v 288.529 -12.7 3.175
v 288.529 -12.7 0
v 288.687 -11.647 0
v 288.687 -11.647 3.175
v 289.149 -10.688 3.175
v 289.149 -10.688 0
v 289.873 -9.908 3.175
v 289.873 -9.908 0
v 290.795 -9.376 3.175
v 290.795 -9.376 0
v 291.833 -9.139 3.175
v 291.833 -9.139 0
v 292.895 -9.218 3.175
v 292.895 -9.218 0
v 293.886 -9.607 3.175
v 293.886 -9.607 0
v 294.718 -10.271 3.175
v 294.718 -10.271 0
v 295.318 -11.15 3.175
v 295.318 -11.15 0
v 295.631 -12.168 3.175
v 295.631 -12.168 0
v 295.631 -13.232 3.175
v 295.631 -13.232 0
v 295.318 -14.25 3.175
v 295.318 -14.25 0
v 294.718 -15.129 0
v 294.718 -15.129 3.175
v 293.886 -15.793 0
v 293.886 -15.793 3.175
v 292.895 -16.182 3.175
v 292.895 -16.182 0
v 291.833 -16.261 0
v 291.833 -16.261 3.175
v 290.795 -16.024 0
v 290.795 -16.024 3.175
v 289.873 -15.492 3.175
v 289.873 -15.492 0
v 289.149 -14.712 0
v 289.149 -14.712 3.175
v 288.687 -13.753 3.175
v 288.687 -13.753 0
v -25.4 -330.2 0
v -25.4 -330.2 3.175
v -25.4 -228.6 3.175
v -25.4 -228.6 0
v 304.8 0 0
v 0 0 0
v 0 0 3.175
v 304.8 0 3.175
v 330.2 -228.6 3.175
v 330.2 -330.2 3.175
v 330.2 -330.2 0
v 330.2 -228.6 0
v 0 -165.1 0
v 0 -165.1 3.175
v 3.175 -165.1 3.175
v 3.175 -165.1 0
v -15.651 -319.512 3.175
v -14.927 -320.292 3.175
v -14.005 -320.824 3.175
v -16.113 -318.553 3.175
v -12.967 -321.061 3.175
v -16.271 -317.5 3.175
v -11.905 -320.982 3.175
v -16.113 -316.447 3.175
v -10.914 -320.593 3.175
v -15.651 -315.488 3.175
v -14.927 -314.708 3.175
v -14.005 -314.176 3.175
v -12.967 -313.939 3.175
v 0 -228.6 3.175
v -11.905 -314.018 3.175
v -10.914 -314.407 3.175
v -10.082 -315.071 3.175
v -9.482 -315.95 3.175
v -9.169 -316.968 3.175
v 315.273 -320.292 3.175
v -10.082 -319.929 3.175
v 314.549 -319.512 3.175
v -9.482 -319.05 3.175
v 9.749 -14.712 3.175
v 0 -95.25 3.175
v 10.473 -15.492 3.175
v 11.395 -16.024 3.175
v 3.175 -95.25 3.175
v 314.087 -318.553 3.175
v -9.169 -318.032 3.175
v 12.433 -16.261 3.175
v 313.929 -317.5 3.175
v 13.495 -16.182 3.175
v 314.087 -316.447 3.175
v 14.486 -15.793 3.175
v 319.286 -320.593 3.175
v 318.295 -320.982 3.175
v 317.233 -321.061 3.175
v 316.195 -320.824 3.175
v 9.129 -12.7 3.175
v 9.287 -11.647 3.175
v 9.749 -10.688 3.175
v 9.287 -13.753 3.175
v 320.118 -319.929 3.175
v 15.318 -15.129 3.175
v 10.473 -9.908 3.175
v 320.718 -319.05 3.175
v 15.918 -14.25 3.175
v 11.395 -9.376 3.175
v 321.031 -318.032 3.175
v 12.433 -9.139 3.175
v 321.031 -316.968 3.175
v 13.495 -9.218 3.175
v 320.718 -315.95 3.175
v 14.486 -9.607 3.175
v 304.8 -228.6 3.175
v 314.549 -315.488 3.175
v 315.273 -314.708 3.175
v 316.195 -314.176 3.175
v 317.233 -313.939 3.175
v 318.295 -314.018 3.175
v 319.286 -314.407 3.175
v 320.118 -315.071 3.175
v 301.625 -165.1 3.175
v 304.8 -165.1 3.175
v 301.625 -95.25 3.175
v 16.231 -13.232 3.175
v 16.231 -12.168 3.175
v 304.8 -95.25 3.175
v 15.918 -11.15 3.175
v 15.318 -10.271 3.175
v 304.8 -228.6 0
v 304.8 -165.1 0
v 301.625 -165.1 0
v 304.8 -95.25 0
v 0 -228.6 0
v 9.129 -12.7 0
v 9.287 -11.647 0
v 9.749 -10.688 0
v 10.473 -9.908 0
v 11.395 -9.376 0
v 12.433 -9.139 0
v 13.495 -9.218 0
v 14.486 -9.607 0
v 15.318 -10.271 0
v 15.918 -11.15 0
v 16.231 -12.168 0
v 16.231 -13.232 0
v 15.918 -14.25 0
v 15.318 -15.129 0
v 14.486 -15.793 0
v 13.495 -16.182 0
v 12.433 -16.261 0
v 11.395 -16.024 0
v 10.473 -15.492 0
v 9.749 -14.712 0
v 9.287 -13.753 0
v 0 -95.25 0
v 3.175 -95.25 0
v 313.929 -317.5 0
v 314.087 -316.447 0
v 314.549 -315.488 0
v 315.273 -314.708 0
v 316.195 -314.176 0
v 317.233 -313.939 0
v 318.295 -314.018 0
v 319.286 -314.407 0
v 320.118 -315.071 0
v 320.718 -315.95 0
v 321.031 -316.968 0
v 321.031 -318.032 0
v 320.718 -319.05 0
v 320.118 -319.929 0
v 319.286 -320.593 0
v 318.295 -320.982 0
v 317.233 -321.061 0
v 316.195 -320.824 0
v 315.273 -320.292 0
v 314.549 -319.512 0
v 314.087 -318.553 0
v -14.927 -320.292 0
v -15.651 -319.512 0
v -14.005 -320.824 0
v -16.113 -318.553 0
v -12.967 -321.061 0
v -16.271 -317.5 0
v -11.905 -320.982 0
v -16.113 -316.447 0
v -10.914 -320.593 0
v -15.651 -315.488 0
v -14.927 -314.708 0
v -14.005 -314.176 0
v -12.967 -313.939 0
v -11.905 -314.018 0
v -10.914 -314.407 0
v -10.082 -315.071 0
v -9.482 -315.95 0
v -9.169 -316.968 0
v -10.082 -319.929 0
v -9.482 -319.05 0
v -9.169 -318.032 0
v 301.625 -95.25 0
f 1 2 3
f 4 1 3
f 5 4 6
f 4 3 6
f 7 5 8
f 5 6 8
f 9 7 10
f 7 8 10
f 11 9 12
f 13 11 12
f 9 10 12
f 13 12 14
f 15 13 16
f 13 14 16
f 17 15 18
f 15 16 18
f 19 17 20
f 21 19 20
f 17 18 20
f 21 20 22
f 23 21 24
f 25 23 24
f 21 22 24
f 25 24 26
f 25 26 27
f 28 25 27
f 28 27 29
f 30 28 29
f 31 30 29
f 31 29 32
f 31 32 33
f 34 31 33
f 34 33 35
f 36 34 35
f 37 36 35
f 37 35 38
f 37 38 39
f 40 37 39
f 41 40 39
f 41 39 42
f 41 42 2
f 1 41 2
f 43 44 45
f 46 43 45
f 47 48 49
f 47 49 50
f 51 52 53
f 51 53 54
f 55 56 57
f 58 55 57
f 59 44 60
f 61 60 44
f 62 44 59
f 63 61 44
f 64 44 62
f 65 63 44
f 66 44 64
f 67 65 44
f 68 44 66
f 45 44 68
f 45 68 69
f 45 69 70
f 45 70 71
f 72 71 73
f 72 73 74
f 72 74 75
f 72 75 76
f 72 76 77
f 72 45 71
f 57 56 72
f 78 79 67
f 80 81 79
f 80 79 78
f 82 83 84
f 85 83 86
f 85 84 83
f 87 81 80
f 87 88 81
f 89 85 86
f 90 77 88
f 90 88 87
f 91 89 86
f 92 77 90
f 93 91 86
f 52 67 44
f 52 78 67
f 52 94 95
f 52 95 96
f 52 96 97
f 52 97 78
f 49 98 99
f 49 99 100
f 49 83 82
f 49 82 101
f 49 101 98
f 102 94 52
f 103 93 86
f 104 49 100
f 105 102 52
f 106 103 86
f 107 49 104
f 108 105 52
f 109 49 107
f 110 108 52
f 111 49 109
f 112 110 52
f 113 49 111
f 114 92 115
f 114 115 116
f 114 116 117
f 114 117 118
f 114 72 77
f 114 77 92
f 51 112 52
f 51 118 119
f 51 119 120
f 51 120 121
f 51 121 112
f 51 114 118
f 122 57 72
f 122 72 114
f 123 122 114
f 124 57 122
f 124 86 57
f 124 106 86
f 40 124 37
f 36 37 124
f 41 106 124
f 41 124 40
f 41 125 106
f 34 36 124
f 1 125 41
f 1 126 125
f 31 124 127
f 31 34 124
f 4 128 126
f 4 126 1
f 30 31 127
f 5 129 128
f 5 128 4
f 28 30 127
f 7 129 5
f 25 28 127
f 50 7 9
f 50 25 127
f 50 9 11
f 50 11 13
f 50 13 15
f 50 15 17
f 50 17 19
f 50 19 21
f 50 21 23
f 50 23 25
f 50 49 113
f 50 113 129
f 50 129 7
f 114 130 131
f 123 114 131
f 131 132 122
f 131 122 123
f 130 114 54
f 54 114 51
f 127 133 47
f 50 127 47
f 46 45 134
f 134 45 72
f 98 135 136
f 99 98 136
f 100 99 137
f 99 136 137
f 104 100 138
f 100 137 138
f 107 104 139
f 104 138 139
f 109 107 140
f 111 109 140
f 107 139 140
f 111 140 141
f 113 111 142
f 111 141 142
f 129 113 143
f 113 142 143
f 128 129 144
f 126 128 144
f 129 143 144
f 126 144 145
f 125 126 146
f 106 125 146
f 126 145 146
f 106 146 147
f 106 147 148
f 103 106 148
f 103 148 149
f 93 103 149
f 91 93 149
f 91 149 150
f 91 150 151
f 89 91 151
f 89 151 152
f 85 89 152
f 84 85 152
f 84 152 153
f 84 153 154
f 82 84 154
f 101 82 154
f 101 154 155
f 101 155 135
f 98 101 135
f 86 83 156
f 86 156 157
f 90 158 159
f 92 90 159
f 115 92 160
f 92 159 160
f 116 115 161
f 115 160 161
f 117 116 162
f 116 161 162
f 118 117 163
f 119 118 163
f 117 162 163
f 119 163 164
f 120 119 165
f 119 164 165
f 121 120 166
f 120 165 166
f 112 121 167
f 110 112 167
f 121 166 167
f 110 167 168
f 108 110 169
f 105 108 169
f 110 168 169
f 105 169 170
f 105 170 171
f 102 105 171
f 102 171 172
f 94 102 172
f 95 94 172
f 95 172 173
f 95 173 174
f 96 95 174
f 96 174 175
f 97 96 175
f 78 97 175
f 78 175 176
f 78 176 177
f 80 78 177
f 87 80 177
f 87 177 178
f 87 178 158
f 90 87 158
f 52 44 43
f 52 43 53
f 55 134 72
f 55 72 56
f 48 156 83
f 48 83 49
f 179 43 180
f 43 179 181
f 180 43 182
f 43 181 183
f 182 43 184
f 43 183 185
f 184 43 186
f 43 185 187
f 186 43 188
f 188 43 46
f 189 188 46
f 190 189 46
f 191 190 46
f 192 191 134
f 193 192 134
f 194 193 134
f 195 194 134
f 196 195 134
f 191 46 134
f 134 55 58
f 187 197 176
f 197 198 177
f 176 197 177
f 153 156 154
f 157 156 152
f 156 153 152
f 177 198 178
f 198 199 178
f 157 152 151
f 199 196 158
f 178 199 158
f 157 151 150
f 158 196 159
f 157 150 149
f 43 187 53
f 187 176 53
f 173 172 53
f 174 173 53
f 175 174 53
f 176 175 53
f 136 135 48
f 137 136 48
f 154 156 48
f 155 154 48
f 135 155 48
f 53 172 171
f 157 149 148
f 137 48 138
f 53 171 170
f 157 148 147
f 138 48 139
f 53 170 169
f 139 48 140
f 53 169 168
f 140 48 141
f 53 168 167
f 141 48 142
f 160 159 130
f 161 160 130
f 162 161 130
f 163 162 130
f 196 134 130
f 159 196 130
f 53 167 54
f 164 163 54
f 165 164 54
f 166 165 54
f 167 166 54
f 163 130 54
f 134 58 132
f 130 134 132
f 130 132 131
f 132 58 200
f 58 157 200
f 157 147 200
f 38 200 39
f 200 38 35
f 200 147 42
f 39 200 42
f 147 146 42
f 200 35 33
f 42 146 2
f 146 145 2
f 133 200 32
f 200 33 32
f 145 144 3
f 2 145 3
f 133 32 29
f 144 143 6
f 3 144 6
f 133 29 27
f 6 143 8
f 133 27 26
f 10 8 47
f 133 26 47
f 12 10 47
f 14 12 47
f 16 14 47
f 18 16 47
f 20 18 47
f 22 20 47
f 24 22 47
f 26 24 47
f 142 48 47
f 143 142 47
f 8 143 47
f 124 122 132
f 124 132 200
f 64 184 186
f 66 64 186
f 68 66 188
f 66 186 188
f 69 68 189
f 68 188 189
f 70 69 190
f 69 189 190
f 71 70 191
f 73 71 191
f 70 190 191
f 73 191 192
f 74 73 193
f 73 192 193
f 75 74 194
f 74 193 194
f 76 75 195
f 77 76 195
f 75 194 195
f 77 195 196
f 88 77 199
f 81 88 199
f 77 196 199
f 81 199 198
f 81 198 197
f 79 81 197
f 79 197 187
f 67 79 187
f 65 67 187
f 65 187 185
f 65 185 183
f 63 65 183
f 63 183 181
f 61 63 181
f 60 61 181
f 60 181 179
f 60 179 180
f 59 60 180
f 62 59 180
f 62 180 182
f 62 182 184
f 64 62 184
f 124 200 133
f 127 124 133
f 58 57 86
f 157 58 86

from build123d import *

# Parameters (mm, degrees)
SKETCH1_W               = 304.8
SKETCH1_H               = 330.2
BOSS_EXTRUDE1_DEPTH     = 3.175
F_1_4_CLEARANCE_HOLE1_D = 7.14248
CUT_EXTRUDE1_REACH      = 451.383
SKETCH4_W               = 3.175
SKETCH4_H               = 69.85
SKETCH5_W               = 25.4
SKETCH5_H               = 101.6
BOSS_EXTRUDE2_DEPTH     = 3.175
F_1_4_CLEARANCE_HOLE2_D = 7.14248


with BuildPart() as part:
    # Sketch1 → Boss-Extrude1 (new body)
    with BuildSketch(Plane.XY):
        with Locations((152.4, -165.1)):
            Rectangle(SKETCH1_W, SKETCH1_H)
    extrude(amount=BOSS_EXTRUDE1_DEPTH)

    # 1/4 Clearance Hole1 (through all)
    with Locations(Plane.XY.offset(3.175)):
        with Locations((12.7, -12.7), (292.1, -12.7)):
            Hole(F_1_4_CLEARANCE_HOLE1_D / 2)

    # Sketch4 → Cut-Extrude1 (cut, up to next)
    with BuildSketch(Plane.XY.offset(3.175), mode=Mode.PRIVATE) as cut_extrude1_sk1:
        with Locations((303.2125, -130.175)):
            Rectangle(SKETCH4_W, SKETCH4_H)
    cut_extrude1_tool1 = extrude(cut_extrude1_sk1.sketch, amount=-CUT_EXTRUDE1_REACH, mode=Mode.PRIVATE) & part.part
    # Sketch4 → Cut-Extrude1 (cut, up to next)
    with BuildSketch(Plane.XY.offset(3.175), mode=Mode.PRIVATE) as cut_extrude1_sk2:
        with Locations((1.5875, -130.175)):
            Rectangle(SKETCH4_W, SKETCH4_H)
    cut_extrude1_tool2 = extrude(cut_extrude1_sk2.sketch, amount=-CUT_EXTRUDE1_REACH, mode=Mode.PRIVATE) & part.part
    add(cut_extrude1_tool1.solids().sort_by_distance((303.2125, -130.175, 3.175))[0], mode=Mode.SUBTRACT)
    add(cut_extrude1_tool2.solids().sort_by_distance((1.5875, -130.175, 3.175))[0], mode=Mode.SUBTRACT)

    # Sketch5 → Boss-Extrude2 (add)
    with BuildSketch(Plane.XY.offset(3.175)):
        with Locations((-12.7, -279.4)):
            Rectangle(SKETCH5_W, SKETCH5_H)
        with Locations((317.5, -279.4)):
            Rectangle(SKETCH5_W, SKETCH5_H)
    extrude(amount=-BOSS_EXTRUDE2_DEPTH)

    # 1/4 Clearance Hole2 (through all)
    with Locations(Plane.XY.offset(3.175)):
        with Locations((317.5, -317.5), (-12.7, -317.5)):
            Hole(F_1_4_CLEARANCE_HOLE2_D / 2)


solid = part.part
